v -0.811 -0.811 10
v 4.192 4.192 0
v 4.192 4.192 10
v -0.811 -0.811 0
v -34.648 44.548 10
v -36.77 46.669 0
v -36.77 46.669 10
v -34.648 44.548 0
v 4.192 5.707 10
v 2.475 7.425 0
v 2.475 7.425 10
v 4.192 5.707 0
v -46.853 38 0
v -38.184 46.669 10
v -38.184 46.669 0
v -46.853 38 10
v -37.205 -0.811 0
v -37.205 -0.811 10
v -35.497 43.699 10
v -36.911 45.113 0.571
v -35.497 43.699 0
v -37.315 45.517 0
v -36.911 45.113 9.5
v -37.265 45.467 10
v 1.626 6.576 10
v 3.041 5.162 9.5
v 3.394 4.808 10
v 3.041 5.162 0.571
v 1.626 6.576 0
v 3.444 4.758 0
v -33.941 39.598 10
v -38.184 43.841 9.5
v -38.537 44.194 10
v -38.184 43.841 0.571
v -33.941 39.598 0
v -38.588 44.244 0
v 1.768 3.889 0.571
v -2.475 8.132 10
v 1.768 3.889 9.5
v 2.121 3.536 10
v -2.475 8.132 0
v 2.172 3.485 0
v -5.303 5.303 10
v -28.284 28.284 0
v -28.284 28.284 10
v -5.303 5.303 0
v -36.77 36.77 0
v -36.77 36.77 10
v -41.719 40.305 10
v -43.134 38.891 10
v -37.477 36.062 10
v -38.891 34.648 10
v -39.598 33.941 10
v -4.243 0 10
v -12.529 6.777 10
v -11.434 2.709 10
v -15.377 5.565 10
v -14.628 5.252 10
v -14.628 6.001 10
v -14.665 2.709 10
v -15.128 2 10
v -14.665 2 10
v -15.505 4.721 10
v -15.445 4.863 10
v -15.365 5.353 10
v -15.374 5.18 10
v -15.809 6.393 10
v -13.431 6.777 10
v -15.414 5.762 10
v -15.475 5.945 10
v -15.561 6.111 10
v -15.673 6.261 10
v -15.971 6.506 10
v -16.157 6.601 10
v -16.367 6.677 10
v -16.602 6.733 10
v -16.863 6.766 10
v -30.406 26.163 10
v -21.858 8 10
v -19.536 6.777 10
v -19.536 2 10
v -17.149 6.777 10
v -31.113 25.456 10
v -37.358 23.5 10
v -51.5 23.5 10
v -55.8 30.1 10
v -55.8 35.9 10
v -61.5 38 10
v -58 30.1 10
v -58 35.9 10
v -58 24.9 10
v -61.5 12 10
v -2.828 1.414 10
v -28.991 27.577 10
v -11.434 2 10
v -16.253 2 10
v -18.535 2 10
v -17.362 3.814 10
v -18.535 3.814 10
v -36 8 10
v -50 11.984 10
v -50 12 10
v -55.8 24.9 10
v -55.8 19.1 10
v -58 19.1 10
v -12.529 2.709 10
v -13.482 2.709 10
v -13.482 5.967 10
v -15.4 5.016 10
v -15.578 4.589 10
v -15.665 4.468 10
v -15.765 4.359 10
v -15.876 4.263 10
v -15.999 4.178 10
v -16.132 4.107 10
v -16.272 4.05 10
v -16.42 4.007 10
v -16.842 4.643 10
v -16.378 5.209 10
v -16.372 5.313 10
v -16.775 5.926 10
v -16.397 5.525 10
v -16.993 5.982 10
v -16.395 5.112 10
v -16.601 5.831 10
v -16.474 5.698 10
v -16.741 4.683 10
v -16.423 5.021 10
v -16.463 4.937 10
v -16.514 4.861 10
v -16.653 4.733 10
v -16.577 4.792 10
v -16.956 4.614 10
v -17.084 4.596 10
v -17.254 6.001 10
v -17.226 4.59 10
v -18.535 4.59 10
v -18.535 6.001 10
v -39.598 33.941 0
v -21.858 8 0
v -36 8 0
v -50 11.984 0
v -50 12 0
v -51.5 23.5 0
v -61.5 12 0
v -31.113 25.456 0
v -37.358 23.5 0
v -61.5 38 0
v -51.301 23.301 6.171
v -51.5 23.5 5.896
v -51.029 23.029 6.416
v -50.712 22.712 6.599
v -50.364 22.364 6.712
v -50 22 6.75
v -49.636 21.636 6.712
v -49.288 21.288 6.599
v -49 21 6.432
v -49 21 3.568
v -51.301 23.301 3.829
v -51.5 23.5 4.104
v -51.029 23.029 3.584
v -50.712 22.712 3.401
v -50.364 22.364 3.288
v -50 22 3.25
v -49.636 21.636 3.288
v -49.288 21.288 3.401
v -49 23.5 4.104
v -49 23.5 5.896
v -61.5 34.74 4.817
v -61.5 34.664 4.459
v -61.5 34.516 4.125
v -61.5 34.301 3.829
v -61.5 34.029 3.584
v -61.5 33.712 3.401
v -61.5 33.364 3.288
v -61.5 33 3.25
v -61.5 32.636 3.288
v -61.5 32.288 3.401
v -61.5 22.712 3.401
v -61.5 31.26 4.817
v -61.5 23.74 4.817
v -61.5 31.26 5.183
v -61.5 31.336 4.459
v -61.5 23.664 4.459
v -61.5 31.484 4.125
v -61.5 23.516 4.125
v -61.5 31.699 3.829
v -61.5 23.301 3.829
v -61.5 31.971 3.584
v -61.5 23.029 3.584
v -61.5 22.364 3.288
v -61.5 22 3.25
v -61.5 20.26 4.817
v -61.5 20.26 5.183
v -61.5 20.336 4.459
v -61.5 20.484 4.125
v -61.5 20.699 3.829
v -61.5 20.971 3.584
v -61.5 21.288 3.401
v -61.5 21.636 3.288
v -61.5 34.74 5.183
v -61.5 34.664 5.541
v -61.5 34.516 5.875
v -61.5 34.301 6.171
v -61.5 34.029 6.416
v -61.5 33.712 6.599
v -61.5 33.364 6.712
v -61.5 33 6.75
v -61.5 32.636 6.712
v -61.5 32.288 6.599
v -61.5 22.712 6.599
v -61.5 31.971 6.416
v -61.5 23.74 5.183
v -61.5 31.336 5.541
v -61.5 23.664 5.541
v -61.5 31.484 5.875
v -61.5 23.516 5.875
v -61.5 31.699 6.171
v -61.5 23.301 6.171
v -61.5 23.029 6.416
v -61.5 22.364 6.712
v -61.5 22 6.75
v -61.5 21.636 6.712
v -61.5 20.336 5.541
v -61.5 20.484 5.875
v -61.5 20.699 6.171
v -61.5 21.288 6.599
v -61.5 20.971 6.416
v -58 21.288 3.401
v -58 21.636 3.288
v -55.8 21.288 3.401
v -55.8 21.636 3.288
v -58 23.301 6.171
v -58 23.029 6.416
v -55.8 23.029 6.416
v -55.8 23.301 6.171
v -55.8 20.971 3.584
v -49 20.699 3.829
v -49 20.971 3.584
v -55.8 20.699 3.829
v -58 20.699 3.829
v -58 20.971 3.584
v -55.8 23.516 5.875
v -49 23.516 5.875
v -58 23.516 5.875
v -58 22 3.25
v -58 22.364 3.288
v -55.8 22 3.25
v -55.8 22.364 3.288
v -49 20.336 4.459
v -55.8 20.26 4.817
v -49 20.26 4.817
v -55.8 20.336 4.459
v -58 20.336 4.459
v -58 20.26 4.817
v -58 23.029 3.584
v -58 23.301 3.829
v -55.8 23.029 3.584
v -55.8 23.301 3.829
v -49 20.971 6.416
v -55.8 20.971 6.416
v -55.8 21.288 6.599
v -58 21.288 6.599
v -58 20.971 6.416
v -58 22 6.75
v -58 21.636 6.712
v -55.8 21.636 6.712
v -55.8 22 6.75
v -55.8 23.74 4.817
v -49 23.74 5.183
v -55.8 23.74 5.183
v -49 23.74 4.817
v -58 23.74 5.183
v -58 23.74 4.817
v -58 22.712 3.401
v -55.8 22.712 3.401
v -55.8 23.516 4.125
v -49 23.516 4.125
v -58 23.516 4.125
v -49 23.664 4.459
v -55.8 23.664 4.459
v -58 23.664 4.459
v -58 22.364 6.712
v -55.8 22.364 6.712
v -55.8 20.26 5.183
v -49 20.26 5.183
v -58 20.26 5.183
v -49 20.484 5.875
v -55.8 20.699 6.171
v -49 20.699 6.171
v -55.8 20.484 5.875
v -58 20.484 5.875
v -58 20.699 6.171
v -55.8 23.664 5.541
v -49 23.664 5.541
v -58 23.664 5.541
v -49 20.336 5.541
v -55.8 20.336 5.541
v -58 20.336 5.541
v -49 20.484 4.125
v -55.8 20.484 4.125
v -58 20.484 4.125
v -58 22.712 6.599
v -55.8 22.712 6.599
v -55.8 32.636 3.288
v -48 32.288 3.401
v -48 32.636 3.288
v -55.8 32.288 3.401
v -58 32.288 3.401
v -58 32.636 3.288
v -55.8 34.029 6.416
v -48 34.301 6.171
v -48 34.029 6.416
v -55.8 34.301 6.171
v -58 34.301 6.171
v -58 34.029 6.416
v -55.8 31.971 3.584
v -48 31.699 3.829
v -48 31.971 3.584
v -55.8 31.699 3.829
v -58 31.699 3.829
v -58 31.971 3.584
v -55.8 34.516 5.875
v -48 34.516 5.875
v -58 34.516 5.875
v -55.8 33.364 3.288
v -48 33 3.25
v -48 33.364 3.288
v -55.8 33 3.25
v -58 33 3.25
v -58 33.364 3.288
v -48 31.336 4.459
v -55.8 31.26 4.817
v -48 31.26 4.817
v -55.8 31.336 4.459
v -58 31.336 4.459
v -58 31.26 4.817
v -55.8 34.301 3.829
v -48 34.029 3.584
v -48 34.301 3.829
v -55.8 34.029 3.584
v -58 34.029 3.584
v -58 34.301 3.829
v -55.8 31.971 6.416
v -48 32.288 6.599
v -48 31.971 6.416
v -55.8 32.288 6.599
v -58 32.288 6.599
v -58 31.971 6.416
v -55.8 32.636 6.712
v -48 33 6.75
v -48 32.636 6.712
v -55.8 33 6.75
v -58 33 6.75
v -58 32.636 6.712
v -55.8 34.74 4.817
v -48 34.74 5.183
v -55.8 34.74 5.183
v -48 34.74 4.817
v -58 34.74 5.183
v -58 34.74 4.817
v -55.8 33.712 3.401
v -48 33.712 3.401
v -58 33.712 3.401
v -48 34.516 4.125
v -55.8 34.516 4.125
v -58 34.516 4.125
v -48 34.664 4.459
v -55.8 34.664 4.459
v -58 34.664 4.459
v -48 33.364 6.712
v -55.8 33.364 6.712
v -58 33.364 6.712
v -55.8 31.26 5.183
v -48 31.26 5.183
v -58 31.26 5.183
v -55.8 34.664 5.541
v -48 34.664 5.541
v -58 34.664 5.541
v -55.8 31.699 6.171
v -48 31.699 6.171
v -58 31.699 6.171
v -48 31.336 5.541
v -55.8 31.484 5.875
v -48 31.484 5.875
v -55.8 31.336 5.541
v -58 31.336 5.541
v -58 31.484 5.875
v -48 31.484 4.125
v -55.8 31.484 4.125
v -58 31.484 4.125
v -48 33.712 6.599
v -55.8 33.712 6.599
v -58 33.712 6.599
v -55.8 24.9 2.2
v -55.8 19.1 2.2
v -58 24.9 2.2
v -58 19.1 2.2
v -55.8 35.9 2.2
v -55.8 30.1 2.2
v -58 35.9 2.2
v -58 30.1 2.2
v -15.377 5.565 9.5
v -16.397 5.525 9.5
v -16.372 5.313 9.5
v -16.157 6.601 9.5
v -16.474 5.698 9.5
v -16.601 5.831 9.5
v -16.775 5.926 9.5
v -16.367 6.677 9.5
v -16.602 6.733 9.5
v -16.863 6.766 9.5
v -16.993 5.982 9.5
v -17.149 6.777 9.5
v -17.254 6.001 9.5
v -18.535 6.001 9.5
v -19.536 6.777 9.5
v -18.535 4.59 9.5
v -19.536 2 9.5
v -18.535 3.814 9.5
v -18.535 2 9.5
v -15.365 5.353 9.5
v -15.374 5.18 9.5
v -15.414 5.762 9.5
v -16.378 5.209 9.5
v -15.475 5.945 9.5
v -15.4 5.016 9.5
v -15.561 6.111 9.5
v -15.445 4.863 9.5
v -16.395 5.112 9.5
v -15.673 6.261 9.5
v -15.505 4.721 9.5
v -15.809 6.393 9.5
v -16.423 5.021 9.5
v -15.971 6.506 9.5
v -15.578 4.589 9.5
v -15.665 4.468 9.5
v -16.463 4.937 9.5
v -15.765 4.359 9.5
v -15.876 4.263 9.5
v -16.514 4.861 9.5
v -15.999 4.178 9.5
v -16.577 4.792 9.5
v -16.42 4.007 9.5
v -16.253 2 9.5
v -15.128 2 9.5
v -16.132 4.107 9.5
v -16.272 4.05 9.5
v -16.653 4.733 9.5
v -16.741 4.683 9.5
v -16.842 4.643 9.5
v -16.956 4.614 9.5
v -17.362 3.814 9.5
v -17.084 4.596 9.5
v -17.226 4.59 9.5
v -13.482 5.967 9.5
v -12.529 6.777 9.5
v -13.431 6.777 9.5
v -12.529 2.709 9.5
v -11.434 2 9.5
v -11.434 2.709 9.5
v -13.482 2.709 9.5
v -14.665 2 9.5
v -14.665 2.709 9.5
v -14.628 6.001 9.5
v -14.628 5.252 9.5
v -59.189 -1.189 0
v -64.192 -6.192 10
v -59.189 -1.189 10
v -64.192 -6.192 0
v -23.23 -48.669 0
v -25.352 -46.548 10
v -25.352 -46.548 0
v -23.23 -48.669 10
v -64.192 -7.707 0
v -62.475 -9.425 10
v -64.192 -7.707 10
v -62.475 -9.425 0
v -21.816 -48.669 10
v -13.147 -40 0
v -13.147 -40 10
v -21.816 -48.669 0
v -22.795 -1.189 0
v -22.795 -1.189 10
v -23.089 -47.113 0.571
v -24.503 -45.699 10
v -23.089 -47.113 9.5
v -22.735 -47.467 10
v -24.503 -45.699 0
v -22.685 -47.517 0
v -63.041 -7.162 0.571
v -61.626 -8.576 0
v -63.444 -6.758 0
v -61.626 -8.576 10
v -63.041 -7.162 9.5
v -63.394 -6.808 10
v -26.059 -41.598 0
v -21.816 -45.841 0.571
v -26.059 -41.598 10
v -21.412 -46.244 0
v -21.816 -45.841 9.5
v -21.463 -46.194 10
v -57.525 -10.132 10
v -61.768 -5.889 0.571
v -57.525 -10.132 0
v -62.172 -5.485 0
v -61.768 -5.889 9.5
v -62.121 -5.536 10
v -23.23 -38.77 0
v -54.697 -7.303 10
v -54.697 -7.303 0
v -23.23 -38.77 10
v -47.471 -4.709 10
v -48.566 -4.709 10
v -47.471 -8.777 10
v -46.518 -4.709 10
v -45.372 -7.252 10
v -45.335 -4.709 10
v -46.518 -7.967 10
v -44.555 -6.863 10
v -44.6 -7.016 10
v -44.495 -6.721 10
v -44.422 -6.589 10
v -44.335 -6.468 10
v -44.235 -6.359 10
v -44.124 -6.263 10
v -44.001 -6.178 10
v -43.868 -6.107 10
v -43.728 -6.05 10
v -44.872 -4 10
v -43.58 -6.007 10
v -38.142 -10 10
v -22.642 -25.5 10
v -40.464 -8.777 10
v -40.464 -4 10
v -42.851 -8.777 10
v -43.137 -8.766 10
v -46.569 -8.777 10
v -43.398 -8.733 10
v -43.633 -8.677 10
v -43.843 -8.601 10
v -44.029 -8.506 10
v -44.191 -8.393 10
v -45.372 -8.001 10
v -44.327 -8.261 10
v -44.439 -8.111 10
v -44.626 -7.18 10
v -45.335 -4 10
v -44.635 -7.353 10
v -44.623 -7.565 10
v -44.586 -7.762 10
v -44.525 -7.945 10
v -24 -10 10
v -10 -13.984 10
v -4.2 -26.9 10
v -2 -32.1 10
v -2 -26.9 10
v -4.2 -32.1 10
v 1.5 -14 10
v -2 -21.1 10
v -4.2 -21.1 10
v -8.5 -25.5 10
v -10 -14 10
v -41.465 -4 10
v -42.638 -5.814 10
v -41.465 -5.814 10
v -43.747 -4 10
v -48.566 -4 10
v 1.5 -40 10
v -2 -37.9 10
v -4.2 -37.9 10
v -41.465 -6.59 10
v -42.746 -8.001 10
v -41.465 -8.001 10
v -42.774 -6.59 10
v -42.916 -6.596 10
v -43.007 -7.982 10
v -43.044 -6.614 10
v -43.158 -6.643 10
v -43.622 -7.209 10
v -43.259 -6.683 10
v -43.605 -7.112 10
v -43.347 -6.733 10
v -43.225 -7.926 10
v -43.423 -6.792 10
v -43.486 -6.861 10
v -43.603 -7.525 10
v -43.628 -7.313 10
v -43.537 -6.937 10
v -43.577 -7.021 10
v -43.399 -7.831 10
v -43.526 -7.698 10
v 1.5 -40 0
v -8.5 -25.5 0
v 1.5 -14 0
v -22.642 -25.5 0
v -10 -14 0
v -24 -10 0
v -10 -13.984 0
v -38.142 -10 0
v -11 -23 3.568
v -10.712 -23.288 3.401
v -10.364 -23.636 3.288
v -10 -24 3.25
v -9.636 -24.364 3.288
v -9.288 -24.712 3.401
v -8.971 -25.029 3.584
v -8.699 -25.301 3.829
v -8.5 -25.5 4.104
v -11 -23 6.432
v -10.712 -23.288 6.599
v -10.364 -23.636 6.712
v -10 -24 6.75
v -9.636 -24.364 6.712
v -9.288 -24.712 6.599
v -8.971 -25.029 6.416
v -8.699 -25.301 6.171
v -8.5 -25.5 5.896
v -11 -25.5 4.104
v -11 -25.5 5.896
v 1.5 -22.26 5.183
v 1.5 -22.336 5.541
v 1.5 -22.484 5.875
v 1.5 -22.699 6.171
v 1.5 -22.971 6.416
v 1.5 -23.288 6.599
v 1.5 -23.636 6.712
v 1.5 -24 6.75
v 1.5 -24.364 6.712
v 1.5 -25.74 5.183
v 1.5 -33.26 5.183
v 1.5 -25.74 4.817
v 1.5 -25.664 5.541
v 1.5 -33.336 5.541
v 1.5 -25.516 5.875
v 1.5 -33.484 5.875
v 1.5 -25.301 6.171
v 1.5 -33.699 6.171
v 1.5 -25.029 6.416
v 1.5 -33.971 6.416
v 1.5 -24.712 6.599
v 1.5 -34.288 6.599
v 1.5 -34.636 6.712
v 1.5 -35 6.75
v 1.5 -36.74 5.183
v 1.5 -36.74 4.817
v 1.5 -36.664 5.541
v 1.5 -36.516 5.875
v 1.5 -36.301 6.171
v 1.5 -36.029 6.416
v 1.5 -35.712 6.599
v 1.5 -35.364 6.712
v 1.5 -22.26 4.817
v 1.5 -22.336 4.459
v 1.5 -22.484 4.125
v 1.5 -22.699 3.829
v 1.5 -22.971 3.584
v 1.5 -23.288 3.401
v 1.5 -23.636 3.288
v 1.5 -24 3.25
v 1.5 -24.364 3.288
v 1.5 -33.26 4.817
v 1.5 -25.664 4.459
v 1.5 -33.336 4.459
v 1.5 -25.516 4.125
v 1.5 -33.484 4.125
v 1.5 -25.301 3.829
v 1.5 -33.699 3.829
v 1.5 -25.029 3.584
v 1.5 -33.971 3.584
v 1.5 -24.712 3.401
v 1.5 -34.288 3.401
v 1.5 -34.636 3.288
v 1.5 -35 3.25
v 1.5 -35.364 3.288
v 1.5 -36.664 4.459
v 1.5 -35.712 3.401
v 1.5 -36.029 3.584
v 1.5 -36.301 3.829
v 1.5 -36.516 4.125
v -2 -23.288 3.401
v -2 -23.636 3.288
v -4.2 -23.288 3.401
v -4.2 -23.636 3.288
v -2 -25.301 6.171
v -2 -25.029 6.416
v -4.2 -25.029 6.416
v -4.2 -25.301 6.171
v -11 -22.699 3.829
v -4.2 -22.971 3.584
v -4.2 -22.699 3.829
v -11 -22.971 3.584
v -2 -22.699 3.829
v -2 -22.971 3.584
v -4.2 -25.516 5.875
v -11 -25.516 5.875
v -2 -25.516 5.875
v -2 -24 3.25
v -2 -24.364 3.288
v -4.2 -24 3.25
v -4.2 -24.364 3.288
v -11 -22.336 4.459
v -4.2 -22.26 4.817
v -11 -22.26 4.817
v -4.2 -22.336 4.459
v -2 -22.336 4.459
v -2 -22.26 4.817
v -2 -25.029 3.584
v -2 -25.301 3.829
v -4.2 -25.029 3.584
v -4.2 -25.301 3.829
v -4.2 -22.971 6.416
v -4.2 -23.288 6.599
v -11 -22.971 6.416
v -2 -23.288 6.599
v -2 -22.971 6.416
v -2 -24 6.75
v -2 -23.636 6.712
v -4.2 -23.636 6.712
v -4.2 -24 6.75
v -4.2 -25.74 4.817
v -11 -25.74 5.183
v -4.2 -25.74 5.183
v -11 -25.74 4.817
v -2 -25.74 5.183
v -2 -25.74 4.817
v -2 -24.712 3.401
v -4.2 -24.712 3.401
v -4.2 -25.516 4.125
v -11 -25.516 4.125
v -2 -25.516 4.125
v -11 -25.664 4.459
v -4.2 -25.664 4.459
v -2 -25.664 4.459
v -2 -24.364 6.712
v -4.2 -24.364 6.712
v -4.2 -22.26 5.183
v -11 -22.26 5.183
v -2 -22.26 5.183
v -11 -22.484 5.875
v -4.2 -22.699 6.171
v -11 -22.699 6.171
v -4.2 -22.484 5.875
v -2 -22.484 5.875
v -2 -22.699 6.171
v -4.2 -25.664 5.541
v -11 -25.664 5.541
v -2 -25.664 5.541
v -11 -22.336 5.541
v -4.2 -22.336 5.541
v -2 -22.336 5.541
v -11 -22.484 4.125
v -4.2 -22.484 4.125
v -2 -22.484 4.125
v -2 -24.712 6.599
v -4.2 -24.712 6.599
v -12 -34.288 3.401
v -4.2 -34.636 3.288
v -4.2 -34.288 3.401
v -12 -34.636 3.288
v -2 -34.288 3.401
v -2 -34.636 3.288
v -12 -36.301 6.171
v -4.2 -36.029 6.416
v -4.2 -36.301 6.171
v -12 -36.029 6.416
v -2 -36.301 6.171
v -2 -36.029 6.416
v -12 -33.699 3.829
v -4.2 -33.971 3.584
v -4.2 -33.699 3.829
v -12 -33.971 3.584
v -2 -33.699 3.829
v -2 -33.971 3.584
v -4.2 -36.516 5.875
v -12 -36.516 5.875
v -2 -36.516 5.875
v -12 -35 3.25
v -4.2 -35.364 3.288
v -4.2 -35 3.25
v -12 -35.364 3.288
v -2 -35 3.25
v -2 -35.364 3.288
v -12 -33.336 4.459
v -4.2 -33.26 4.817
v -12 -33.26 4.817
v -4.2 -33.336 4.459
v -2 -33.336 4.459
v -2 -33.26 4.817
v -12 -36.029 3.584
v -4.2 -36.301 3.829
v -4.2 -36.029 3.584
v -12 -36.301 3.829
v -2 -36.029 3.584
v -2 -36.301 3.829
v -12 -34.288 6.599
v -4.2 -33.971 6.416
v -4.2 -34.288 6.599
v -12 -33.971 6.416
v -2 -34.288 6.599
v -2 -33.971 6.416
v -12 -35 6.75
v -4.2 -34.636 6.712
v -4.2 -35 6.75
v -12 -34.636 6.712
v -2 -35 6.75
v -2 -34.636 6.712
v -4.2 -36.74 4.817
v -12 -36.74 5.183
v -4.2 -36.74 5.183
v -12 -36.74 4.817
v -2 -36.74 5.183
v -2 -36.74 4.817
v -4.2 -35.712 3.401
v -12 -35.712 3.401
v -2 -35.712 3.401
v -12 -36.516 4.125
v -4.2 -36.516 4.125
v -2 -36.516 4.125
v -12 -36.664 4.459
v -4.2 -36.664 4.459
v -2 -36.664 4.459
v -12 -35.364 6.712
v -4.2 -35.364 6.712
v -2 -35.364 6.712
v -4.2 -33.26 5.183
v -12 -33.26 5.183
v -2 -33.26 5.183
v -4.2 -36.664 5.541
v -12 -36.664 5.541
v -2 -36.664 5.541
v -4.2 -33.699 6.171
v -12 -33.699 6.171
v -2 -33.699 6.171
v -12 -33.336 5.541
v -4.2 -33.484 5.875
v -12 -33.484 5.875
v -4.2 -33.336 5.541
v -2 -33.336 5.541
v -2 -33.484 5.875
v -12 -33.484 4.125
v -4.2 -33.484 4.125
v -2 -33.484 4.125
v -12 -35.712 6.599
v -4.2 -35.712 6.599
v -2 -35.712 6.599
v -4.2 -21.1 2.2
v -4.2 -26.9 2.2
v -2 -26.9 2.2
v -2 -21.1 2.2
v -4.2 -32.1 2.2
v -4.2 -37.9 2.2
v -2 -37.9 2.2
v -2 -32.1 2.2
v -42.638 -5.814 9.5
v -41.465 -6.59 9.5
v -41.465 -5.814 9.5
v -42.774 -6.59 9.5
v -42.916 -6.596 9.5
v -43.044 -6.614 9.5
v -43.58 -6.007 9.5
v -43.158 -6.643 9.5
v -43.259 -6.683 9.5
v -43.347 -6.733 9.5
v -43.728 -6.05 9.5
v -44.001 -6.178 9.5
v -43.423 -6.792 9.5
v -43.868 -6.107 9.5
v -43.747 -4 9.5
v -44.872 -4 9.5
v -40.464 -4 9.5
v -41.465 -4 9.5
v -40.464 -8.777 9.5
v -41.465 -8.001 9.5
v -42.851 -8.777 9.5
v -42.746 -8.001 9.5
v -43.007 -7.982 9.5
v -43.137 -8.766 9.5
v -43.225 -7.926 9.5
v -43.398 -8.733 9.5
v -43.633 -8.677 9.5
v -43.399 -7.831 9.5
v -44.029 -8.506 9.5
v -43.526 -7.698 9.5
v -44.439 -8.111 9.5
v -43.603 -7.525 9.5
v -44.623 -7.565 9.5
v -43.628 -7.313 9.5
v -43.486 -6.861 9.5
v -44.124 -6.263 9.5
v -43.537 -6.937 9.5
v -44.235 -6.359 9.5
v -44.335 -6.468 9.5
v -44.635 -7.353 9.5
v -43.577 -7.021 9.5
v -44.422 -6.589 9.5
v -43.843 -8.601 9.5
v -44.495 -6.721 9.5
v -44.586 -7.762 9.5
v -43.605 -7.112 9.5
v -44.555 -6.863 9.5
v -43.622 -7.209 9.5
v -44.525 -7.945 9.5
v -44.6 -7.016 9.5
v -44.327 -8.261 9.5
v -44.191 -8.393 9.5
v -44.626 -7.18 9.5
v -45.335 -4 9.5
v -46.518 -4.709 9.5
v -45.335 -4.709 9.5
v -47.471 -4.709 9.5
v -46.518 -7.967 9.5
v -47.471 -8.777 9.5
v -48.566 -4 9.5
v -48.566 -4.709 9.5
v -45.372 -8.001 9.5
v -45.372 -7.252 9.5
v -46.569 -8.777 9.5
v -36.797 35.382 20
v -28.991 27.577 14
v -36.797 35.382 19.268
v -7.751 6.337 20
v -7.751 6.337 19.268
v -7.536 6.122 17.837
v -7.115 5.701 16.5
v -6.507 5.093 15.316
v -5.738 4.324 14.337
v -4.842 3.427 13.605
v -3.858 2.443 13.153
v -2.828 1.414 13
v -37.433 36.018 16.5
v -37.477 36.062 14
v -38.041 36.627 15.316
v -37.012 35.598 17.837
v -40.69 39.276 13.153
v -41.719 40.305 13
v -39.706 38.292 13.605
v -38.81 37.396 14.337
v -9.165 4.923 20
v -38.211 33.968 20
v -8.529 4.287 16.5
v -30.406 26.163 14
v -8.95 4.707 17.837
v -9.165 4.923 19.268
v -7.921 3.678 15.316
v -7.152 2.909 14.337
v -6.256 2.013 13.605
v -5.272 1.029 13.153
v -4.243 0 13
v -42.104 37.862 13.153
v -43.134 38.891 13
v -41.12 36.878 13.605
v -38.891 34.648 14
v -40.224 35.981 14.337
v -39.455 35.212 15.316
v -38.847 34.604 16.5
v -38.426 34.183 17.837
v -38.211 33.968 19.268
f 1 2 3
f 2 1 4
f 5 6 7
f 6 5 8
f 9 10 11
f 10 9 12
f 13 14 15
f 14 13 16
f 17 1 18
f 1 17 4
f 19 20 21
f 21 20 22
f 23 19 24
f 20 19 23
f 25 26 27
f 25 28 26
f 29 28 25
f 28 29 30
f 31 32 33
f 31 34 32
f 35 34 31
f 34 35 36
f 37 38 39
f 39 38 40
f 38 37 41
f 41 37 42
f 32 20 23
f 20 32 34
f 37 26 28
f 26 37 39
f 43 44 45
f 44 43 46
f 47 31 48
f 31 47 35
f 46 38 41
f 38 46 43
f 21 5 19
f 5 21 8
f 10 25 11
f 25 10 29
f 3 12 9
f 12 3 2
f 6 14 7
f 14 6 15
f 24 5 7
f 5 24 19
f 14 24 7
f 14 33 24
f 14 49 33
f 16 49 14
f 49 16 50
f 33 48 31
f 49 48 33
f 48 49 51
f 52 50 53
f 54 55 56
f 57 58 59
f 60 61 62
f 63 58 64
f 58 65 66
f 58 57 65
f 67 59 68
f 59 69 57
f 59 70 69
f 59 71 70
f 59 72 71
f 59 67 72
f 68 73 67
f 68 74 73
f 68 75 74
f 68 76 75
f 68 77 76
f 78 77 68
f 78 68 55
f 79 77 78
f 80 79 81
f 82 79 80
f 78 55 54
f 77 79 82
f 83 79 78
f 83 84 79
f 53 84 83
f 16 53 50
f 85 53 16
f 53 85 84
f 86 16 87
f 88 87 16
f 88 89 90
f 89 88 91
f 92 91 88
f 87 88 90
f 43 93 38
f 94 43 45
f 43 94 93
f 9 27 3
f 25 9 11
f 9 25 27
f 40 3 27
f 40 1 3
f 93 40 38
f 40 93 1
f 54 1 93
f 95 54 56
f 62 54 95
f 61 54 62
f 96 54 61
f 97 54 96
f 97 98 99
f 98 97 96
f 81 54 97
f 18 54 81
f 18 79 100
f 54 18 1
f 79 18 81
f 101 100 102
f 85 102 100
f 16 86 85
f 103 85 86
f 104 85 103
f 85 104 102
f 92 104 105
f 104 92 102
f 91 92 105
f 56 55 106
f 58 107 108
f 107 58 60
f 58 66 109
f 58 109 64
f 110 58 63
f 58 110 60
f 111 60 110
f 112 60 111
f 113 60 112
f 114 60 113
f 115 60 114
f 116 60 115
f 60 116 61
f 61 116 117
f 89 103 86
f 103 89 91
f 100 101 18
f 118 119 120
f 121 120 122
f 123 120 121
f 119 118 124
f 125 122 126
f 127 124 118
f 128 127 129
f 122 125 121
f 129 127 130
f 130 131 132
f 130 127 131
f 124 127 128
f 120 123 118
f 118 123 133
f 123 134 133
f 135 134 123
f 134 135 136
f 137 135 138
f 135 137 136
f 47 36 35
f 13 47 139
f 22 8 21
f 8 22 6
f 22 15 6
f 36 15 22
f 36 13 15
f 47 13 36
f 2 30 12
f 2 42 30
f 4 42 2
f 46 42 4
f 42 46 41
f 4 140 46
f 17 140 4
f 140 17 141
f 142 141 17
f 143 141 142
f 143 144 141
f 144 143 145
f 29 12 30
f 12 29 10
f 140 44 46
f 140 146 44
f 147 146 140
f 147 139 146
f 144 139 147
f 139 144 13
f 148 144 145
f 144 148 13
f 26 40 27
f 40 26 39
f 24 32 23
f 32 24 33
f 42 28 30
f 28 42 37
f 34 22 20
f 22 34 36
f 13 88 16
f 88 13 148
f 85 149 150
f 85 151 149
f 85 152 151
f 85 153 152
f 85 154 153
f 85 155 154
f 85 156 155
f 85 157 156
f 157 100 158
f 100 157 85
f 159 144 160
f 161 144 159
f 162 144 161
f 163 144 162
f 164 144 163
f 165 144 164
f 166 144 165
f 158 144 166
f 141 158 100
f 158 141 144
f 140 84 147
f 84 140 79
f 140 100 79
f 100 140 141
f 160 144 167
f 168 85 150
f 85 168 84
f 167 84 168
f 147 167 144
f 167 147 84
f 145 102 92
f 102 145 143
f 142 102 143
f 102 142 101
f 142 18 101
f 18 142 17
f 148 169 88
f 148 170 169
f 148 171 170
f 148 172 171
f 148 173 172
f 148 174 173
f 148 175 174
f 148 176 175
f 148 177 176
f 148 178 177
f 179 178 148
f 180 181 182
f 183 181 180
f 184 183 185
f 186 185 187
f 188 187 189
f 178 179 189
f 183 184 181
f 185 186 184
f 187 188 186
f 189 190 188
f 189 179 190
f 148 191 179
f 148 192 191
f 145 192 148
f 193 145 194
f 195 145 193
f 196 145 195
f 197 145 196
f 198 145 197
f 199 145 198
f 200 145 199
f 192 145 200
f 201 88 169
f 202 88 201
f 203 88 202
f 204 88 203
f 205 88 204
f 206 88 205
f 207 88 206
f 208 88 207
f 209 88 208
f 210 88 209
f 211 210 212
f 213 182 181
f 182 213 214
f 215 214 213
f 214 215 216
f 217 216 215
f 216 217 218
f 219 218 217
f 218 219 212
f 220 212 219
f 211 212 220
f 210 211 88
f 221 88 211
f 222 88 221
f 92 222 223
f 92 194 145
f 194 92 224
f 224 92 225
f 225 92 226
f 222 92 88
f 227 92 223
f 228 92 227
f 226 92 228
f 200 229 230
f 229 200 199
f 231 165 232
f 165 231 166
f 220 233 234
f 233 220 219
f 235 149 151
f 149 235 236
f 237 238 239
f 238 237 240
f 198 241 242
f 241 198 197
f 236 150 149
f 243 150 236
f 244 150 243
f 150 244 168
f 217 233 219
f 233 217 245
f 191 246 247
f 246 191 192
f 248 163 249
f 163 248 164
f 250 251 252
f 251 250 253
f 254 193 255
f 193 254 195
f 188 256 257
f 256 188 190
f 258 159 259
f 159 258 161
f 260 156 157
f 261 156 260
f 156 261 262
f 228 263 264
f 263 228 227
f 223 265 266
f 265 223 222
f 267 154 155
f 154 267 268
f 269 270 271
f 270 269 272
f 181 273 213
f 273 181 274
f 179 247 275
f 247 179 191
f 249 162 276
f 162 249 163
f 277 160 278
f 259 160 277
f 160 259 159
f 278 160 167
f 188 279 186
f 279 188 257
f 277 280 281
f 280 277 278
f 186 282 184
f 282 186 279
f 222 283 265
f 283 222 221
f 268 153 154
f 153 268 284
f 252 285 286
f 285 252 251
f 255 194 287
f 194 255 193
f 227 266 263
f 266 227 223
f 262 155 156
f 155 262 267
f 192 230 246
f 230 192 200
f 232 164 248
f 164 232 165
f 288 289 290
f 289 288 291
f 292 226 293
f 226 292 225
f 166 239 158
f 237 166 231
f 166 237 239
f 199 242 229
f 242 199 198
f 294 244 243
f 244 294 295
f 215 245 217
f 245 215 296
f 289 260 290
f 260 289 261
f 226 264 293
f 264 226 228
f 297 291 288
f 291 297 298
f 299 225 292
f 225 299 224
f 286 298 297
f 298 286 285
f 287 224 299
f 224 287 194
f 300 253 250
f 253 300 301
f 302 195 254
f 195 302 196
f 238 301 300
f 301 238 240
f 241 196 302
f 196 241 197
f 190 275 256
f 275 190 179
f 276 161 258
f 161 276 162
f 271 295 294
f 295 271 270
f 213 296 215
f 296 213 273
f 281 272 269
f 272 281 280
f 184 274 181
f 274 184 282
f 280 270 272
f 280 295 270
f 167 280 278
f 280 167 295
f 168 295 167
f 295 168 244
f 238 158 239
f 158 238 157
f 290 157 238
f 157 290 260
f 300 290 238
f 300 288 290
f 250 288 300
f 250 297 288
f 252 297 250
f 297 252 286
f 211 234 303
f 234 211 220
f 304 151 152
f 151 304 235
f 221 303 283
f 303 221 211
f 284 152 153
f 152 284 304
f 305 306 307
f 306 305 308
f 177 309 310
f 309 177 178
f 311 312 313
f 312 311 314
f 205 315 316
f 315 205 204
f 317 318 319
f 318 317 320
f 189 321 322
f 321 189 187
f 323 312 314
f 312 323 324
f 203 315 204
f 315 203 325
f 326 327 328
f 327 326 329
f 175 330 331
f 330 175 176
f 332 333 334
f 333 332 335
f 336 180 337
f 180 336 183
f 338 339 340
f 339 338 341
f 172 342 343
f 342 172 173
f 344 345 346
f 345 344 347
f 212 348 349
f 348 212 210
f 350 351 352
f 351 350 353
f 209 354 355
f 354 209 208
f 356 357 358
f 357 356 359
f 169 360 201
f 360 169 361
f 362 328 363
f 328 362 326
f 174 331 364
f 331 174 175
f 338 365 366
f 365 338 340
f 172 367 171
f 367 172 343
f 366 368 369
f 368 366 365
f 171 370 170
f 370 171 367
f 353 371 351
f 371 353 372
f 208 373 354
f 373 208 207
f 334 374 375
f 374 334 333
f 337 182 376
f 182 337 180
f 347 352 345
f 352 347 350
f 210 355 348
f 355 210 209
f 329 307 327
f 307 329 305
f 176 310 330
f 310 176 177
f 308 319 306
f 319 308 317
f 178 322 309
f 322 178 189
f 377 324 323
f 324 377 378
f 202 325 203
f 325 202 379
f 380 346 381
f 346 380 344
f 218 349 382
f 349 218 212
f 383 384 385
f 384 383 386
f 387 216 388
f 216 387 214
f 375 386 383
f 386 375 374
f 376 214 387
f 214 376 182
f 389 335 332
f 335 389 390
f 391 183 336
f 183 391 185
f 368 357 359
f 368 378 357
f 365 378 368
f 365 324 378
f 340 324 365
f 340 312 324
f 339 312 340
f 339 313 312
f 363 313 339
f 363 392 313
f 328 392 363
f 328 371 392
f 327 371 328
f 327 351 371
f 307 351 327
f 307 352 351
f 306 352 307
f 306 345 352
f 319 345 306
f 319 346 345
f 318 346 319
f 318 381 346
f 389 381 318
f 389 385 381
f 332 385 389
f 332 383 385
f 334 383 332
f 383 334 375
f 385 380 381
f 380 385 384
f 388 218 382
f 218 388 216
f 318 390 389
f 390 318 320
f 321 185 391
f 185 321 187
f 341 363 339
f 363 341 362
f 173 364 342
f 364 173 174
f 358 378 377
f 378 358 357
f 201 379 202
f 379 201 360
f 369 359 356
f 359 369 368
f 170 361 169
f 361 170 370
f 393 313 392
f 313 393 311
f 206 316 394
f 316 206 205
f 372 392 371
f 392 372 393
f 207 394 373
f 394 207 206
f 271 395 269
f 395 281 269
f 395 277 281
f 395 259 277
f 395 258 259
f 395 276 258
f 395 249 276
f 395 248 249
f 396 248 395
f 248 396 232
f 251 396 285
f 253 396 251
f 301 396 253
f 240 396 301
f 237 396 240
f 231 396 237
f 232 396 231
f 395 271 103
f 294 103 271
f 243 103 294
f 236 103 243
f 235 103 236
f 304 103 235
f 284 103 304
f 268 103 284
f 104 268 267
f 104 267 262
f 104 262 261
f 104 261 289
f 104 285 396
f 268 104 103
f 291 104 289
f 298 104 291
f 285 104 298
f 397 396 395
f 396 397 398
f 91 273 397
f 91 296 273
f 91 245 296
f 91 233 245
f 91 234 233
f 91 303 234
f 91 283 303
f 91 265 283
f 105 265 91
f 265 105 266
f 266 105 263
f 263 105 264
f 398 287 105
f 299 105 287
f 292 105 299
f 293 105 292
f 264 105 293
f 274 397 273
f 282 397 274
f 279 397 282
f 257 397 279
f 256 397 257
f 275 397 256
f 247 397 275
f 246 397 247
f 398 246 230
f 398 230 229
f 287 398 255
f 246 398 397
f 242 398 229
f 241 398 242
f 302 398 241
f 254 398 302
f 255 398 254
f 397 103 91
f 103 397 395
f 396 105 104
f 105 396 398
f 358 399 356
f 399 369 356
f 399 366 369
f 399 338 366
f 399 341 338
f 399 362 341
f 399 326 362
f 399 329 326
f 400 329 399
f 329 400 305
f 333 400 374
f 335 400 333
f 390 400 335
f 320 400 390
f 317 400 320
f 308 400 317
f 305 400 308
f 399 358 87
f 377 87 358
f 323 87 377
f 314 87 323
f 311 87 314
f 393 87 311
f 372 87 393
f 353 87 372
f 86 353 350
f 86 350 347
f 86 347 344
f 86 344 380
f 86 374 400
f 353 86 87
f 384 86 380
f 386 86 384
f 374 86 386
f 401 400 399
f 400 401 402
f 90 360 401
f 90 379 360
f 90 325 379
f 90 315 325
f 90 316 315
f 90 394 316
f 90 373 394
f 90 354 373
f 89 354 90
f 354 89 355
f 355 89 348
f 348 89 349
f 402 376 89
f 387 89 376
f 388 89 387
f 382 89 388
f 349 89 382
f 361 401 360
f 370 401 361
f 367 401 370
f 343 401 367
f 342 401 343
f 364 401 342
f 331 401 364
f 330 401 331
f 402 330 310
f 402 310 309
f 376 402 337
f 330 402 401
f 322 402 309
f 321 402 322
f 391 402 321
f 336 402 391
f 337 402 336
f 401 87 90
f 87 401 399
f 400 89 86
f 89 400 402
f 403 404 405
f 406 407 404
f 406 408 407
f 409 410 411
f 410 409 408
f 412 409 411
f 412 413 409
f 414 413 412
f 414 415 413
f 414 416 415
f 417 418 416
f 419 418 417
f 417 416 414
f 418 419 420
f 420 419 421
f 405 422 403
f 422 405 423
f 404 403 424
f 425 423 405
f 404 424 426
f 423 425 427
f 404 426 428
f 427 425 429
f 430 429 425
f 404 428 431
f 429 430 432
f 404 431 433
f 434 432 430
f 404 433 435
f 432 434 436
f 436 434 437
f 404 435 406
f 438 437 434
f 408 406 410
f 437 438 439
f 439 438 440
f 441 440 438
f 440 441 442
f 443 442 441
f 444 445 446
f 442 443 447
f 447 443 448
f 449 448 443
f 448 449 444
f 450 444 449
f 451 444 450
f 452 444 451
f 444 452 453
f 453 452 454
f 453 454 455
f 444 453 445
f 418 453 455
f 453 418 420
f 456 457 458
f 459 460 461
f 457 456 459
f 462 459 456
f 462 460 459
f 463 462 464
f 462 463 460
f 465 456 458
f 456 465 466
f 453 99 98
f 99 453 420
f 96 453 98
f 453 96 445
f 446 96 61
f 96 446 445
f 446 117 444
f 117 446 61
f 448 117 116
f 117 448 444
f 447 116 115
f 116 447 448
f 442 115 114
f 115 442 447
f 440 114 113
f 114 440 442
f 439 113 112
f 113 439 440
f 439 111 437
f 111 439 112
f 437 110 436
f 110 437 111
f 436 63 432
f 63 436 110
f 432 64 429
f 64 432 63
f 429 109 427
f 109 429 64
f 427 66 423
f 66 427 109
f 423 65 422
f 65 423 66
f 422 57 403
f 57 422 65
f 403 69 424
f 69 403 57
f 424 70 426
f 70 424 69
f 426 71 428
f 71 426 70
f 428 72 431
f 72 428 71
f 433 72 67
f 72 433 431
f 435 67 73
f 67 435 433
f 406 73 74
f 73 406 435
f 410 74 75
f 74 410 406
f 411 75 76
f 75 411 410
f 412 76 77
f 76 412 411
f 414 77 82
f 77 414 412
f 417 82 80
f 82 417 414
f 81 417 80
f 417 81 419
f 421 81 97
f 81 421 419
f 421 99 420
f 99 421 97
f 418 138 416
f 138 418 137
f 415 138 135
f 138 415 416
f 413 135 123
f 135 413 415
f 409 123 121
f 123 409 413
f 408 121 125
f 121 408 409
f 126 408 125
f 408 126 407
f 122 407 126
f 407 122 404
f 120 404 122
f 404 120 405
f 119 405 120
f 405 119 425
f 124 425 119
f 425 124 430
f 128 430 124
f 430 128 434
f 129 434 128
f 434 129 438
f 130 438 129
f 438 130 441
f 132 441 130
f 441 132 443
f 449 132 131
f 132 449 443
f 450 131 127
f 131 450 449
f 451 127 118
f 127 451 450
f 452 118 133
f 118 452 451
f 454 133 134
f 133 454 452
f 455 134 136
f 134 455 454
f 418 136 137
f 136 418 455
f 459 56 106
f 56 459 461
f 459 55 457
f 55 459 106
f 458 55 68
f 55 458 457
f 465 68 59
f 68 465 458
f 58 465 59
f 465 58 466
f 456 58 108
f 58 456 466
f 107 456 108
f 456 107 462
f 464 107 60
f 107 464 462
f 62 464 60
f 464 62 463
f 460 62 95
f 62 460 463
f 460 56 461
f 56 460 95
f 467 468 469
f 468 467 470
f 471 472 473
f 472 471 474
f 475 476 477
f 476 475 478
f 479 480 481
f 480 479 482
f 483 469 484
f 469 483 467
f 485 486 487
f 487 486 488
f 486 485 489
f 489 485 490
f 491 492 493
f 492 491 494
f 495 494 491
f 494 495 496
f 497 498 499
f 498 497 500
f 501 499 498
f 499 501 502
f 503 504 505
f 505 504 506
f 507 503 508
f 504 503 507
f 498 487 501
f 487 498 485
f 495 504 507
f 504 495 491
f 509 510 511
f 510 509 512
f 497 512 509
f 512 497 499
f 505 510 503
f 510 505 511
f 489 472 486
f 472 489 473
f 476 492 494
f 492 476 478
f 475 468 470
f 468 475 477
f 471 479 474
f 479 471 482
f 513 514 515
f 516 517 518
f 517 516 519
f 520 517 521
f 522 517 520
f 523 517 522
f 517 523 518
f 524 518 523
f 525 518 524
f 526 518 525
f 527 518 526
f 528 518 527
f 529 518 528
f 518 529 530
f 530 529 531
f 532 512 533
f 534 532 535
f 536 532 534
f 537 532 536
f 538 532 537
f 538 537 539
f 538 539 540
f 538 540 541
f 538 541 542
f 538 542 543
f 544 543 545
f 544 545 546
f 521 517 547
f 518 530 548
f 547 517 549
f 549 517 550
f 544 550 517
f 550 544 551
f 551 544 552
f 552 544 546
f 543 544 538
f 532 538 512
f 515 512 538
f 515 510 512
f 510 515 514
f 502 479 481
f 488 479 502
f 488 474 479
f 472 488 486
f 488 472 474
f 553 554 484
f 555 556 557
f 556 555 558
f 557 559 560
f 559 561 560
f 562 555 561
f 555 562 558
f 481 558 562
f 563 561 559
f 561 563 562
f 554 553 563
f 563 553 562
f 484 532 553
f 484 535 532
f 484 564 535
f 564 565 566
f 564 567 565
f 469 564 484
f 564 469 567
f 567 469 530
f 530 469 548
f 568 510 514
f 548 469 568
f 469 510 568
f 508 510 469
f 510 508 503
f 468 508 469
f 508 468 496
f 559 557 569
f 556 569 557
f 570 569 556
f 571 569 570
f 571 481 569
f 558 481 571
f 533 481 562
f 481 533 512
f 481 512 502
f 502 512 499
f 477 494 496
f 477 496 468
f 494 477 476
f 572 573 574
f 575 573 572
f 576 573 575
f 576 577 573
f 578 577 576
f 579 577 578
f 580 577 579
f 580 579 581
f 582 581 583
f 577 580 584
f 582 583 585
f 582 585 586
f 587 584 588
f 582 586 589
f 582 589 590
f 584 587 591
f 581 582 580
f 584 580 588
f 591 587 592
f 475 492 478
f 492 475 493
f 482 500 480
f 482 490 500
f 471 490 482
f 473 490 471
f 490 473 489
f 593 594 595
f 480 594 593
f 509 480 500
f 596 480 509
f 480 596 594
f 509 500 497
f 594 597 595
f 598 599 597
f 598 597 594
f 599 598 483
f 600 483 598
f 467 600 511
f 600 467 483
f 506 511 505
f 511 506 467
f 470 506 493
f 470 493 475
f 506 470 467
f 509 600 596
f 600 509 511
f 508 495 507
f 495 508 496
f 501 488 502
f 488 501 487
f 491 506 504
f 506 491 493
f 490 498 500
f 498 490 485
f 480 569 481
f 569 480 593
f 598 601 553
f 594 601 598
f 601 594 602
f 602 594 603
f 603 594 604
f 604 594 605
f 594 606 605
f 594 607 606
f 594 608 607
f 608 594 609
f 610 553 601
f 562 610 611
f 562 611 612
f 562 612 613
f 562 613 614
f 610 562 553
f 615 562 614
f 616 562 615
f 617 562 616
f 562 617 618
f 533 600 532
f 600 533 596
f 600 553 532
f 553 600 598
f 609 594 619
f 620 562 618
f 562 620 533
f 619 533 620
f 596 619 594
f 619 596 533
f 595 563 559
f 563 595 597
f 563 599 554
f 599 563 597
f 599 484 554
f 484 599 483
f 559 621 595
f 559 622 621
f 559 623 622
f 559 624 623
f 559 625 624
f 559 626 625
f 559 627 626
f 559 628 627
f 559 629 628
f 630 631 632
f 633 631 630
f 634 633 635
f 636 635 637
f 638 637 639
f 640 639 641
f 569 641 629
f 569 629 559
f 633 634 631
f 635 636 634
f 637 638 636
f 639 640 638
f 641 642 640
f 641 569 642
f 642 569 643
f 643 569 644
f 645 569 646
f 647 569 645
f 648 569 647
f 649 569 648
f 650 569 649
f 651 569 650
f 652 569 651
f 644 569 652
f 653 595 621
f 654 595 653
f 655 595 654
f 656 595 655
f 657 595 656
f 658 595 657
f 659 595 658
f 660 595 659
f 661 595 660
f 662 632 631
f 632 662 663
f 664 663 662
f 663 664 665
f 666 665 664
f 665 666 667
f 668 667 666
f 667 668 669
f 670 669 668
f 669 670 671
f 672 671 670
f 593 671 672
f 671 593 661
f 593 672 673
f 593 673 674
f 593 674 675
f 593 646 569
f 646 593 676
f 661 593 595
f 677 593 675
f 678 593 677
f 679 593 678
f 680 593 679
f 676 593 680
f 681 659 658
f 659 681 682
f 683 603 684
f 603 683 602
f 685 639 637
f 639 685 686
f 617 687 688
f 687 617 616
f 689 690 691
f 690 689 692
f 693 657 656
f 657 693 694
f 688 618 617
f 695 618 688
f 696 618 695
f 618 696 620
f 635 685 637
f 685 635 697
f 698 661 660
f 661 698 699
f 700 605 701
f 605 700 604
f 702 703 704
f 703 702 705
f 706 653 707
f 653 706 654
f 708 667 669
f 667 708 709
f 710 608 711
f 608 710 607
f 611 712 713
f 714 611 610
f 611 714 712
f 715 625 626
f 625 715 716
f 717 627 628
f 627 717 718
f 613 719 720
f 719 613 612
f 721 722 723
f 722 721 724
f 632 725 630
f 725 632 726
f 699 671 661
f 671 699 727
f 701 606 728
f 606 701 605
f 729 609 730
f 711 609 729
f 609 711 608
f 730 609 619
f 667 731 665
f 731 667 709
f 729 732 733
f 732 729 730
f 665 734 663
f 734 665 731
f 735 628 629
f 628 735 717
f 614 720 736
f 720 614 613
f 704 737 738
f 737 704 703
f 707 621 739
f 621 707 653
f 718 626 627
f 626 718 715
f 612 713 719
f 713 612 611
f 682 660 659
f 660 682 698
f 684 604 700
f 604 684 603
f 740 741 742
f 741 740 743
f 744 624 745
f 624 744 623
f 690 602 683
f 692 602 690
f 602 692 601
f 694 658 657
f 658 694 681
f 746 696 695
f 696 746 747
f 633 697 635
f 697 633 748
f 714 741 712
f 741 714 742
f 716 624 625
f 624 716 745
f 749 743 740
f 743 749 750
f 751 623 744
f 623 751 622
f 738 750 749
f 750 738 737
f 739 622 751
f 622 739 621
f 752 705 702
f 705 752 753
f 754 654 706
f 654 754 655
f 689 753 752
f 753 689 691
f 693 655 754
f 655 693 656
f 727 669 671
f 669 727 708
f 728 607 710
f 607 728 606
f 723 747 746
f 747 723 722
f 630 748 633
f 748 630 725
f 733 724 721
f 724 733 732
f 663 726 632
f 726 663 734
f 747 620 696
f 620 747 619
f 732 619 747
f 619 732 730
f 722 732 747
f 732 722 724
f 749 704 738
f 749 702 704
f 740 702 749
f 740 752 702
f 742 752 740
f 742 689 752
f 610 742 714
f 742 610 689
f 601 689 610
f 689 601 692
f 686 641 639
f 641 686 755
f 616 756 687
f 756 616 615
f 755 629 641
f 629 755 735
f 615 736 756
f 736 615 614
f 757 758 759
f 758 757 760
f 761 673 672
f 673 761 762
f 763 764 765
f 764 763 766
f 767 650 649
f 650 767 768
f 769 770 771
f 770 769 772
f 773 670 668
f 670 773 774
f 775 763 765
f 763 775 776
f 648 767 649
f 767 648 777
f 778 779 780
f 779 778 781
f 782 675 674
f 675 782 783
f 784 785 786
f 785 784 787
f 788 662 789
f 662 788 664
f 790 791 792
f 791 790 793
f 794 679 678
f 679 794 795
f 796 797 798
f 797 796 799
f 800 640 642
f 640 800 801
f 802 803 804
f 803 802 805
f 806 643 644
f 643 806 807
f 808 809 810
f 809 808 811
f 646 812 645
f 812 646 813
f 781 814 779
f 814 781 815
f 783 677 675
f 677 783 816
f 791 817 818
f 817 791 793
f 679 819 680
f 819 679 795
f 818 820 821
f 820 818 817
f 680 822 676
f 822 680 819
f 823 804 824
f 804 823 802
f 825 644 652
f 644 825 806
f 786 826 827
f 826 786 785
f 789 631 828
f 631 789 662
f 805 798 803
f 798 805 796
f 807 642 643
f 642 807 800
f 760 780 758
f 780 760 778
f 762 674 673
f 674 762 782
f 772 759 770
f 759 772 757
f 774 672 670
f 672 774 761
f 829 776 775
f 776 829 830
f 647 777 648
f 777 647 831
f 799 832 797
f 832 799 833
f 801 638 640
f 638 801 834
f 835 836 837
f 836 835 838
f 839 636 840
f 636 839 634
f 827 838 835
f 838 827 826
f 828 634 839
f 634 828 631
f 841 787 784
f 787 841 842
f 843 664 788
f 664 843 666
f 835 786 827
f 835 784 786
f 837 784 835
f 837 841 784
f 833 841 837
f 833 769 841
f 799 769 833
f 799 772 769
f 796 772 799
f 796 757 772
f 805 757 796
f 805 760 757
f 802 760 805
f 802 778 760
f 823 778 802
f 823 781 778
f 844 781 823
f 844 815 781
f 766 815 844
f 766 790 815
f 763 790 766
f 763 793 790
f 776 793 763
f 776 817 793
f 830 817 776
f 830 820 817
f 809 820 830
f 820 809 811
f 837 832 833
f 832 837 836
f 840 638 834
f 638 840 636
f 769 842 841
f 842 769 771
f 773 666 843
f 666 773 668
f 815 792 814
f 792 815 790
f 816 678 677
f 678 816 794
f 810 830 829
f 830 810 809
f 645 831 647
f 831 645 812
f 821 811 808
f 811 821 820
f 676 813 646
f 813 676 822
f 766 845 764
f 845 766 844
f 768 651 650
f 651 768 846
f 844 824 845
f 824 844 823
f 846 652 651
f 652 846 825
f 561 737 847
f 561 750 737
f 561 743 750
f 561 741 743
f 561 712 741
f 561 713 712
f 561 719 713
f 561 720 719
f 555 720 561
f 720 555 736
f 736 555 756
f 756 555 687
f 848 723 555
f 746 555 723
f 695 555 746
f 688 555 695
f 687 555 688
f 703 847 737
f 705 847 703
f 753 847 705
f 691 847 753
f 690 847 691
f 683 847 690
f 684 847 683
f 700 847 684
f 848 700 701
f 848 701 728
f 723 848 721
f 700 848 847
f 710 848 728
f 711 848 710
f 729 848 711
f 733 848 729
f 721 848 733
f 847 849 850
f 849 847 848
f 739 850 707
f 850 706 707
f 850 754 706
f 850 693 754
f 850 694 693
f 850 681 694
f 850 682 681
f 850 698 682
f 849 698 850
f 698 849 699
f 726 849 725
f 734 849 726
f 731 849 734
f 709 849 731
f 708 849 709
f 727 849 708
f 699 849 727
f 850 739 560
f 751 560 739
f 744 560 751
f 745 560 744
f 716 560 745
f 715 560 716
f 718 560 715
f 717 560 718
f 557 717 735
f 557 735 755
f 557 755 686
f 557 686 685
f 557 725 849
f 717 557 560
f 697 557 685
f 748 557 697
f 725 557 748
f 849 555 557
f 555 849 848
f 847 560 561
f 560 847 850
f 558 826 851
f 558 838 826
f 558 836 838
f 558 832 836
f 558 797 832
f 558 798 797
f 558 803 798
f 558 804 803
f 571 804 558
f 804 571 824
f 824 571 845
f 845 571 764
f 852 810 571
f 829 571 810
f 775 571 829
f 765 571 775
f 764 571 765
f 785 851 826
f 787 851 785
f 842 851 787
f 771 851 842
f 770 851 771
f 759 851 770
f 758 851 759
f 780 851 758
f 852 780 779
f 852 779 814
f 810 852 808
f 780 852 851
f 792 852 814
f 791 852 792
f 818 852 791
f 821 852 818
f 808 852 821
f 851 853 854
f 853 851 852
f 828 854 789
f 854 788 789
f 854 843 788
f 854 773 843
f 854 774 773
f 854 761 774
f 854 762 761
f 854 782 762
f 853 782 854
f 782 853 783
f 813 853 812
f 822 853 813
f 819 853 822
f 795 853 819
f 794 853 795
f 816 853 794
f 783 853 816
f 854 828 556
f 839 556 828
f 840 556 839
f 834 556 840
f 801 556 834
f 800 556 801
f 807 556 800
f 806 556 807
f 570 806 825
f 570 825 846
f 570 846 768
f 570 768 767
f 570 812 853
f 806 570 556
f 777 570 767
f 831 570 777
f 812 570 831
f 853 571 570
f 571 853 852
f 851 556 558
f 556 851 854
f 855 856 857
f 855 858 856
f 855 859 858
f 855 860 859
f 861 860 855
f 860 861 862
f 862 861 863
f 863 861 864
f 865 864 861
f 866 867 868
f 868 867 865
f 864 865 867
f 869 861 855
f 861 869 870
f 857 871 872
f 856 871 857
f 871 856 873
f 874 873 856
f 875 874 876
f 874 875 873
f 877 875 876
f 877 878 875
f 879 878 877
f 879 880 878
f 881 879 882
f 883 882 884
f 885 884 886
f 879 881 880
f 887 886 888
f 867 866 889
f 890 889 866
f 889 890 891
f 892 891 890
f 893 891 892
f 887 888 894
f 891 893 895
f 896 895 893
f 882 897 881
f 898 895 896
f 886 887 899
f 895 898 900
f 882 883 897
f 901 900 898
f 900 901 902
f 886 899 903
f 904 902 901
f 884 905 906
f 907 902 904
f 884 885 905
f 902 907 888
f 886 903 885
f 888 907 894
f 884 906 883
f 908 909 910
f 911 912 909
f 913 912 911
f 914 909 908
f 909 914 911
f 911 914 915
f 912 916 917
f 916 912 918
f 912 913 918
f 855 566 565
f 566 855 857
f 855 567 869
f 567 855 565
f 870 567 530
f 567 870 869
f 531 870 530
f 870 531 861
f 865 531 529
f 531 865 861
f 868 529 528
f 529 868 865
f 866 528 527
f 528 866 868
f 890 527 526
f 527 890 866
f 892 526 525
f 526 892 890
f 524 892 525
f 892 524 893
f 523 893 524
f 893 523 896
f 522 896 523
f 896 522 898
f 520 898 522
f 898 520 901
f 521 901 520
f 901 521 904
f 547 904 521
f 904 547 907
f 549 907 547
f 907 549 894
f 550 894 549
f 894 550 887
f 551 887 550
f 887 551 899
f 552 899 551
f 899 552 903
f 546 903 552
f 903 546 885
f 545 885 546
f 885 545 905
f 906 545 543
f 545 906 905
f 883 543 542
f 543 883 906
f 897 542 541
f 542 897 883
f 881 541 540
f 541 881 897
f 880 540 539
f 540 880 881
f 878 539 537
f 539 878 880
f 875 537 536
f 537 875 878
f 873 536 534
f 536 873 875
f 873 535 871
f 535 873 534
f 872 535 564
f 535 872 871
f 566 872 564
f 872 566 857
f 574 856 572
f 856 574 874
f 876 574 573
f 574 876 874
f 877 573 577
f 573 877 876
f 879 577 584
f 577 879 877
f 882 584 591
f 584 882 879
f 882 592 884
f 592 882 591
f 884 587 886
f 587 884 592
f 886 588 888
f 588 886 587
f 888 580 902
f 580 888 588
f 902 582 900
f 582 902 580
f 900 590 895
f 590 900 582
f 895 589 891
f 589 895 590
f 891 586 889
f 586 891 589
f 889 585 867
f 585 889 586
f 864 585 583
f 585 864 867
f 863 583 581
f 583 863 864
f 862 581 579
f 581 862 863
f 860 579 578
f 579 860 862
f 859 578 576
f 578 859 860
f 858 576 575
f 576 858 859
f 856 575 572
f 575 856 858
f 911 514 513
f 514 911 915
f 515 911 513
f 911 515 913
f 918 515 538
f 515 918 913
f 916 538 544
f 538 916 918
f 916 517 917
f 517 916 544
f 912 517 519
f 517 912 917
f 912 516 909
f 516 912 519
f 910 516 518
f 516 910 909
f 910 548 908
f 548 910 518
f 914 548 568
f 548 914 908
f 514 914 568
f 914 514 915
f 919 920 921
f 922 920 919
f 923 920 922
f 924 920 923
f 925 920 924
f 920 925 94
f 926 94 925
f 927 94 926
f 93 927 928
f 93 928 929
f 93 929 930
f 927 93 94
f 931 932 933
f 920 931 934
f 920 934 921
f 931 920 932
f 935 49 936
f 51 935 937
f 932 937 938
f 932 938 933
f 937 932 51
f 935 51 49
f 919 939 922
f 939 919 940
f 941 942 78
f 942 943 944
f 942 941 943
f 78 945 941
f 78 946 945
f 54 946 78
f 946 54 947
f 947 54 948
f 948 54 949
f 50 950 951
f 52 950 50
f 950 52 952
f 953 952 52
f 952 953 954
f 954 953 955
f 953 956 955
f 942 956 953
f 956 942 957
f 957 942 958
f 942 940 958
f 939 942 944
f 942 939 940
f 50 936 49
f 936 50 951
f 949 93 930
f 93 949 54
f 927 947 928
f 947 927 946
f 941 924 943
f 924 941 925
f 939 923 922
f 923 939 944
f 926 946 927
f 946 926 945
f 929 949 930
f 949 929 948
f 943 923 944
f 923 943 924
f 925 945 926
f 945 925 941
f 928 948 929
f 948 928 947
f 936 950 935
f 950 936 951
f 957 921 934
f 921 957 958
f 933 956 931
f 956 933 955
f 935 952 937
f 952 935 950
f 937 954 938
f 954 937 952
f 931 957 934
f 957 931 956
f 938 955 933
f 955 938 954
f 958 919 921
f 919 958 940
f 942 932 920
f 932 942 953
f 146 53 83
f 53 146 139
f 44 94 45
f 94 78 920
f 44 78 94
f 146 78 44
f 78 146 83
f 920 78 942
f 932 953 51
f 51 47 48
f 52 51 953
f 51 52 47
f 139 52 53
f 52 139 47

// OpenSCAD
// PRUSA iteration4
// lcd supports
// GNU GPL v3
// Josef Průša <iam@josefprusa.cz> and contributors
// http://www.reprap.org/wiki/Prusa_Mendel
// http://prusamendel.org

// Added a 'cutout' for the contrast POT on the cheap-o RAMPS boards.
pot_cutout = 1;


module body()
{

    difference() 
        {
        // base block
        translate([-55,-2,0]) cube([69,81,10]); 

            union ()
            {
                // outer body shape
                translate([-69.6,32,-1]) rotate([0,0,45]) cube([60,53,15]); 
                translate([13.7,89.7,-1]) rotate([0,0,135]) cube([60,42,15]);
                translate([-19,-9,-1]) cube([60,9,15] );   
                translate([7,-3,-1]) cube([60,68,16]);  
                translate([-16,60,-1]) cube([60,50,15] );
                translate([-41, -45,-1]) rotate([0,0,45]) cube([60,80,13]);  
                
                // pcb cout out
                translate([4,1.5,-1]) cube([1.8,56.5,17]); 
                translate([0,7.5,-1]) cube([5.8,44.5,17]); 
                translate([4.8,3.5,-1]) cube([5.8,52.5,17]);
                translate([8,-5,-1] ) rotate([0,0,45]) cube([5,5,17]);
                translate([8,58,-1]) rotate([0,0,45]) cube([5,5,17]);
            }

            // pcb inserts
            translate([4,3,8]) rotate([45,0,0]) cube([1.8,5,5]); 
            translate([4,56.5,8]) rotate([45,0,0]) cube([1.8,5,5]);     
            translate([4,3,-5]) rotate([45,0,0]) cube([1.8,5,5]); 
            translate([4,56.5,-5]) rotate([45,0,0]) cube([1.8,5,5]);     
        }
}



module support()
{
    difference() 
    {
    
        union()
        {
            rotate([0,0,45]) body();
            // screw block
            translate([-72,22,0])  cube([30,16,10]);    
        }
        
        // lower angled part cut
        translate([-75,-2,-1])  cube([20,14,15]);    
        translate([-70,-2,-1]) cube([20,14,15]);    
        translate([-50,-16.3,-1]) rotate([0,0,45]) cube([20,20,15]);    
        
        translate([-76.5,-2,-1]) cube([15,40,15]);    
        
        difference()
        {
            translate([-28,0,-1]) rotate([0,0,45]) cube([10,40,15]);    
            translate([-38,-12,-1]) cube([20,20,15]);    
            translate([-58,23.5,-1]) cube([25,25,15]);    
        }
        
        // screw holes
        translate([-71,18+4,5]) rotate([0,90,0]) cylinder(h=22, r=1.75, $fn=30);  
        translate([-70,29+4,5]) rotate([0,90,0]) cylinder(h=22, r=1.75, $fn=30);  
        
        // nut traps
        translate([-58,15.1+4,5-2.8]) cube([2.2,5.8,29.7]);    
        translate([-58,26.1+4,5-2.8]) cube([2.2,5.8,29.7]); 
     
        // version
        translate([-20,2,9.5]) rotate([0,0,0]) linear_extrude(height = 0.6) 
        { text("R1",font = "helvetica:style=Bold", size=5, center=true); }   
    }
}


module left_lcd_support()
{
    difference() {
        union() {
            support();
            rotate([0,0,45]) difference()
            {
                // sd card shield
                translate([-3,3,10])  cube([2,55,10]); 
                translate([-4,3,20]) rotate([0,90,0]) cylinder( h=4, r=7, $fn=30); 
                translate([-4,58,20]) rotate([0,90,0]) cylinder( h=4, r=7, $fn=30); 
            }
        }
        if (pot_cutout == 1) {
            rotate([0, 0, 45]) translate([-4, 40, 14]) rotate([0, 90, 0]) cube([14, 12, 10]);
        }
    }
}

translate([-60,-2,0]) rotate([0,0,180]) support();
left_lcd_support();

 
